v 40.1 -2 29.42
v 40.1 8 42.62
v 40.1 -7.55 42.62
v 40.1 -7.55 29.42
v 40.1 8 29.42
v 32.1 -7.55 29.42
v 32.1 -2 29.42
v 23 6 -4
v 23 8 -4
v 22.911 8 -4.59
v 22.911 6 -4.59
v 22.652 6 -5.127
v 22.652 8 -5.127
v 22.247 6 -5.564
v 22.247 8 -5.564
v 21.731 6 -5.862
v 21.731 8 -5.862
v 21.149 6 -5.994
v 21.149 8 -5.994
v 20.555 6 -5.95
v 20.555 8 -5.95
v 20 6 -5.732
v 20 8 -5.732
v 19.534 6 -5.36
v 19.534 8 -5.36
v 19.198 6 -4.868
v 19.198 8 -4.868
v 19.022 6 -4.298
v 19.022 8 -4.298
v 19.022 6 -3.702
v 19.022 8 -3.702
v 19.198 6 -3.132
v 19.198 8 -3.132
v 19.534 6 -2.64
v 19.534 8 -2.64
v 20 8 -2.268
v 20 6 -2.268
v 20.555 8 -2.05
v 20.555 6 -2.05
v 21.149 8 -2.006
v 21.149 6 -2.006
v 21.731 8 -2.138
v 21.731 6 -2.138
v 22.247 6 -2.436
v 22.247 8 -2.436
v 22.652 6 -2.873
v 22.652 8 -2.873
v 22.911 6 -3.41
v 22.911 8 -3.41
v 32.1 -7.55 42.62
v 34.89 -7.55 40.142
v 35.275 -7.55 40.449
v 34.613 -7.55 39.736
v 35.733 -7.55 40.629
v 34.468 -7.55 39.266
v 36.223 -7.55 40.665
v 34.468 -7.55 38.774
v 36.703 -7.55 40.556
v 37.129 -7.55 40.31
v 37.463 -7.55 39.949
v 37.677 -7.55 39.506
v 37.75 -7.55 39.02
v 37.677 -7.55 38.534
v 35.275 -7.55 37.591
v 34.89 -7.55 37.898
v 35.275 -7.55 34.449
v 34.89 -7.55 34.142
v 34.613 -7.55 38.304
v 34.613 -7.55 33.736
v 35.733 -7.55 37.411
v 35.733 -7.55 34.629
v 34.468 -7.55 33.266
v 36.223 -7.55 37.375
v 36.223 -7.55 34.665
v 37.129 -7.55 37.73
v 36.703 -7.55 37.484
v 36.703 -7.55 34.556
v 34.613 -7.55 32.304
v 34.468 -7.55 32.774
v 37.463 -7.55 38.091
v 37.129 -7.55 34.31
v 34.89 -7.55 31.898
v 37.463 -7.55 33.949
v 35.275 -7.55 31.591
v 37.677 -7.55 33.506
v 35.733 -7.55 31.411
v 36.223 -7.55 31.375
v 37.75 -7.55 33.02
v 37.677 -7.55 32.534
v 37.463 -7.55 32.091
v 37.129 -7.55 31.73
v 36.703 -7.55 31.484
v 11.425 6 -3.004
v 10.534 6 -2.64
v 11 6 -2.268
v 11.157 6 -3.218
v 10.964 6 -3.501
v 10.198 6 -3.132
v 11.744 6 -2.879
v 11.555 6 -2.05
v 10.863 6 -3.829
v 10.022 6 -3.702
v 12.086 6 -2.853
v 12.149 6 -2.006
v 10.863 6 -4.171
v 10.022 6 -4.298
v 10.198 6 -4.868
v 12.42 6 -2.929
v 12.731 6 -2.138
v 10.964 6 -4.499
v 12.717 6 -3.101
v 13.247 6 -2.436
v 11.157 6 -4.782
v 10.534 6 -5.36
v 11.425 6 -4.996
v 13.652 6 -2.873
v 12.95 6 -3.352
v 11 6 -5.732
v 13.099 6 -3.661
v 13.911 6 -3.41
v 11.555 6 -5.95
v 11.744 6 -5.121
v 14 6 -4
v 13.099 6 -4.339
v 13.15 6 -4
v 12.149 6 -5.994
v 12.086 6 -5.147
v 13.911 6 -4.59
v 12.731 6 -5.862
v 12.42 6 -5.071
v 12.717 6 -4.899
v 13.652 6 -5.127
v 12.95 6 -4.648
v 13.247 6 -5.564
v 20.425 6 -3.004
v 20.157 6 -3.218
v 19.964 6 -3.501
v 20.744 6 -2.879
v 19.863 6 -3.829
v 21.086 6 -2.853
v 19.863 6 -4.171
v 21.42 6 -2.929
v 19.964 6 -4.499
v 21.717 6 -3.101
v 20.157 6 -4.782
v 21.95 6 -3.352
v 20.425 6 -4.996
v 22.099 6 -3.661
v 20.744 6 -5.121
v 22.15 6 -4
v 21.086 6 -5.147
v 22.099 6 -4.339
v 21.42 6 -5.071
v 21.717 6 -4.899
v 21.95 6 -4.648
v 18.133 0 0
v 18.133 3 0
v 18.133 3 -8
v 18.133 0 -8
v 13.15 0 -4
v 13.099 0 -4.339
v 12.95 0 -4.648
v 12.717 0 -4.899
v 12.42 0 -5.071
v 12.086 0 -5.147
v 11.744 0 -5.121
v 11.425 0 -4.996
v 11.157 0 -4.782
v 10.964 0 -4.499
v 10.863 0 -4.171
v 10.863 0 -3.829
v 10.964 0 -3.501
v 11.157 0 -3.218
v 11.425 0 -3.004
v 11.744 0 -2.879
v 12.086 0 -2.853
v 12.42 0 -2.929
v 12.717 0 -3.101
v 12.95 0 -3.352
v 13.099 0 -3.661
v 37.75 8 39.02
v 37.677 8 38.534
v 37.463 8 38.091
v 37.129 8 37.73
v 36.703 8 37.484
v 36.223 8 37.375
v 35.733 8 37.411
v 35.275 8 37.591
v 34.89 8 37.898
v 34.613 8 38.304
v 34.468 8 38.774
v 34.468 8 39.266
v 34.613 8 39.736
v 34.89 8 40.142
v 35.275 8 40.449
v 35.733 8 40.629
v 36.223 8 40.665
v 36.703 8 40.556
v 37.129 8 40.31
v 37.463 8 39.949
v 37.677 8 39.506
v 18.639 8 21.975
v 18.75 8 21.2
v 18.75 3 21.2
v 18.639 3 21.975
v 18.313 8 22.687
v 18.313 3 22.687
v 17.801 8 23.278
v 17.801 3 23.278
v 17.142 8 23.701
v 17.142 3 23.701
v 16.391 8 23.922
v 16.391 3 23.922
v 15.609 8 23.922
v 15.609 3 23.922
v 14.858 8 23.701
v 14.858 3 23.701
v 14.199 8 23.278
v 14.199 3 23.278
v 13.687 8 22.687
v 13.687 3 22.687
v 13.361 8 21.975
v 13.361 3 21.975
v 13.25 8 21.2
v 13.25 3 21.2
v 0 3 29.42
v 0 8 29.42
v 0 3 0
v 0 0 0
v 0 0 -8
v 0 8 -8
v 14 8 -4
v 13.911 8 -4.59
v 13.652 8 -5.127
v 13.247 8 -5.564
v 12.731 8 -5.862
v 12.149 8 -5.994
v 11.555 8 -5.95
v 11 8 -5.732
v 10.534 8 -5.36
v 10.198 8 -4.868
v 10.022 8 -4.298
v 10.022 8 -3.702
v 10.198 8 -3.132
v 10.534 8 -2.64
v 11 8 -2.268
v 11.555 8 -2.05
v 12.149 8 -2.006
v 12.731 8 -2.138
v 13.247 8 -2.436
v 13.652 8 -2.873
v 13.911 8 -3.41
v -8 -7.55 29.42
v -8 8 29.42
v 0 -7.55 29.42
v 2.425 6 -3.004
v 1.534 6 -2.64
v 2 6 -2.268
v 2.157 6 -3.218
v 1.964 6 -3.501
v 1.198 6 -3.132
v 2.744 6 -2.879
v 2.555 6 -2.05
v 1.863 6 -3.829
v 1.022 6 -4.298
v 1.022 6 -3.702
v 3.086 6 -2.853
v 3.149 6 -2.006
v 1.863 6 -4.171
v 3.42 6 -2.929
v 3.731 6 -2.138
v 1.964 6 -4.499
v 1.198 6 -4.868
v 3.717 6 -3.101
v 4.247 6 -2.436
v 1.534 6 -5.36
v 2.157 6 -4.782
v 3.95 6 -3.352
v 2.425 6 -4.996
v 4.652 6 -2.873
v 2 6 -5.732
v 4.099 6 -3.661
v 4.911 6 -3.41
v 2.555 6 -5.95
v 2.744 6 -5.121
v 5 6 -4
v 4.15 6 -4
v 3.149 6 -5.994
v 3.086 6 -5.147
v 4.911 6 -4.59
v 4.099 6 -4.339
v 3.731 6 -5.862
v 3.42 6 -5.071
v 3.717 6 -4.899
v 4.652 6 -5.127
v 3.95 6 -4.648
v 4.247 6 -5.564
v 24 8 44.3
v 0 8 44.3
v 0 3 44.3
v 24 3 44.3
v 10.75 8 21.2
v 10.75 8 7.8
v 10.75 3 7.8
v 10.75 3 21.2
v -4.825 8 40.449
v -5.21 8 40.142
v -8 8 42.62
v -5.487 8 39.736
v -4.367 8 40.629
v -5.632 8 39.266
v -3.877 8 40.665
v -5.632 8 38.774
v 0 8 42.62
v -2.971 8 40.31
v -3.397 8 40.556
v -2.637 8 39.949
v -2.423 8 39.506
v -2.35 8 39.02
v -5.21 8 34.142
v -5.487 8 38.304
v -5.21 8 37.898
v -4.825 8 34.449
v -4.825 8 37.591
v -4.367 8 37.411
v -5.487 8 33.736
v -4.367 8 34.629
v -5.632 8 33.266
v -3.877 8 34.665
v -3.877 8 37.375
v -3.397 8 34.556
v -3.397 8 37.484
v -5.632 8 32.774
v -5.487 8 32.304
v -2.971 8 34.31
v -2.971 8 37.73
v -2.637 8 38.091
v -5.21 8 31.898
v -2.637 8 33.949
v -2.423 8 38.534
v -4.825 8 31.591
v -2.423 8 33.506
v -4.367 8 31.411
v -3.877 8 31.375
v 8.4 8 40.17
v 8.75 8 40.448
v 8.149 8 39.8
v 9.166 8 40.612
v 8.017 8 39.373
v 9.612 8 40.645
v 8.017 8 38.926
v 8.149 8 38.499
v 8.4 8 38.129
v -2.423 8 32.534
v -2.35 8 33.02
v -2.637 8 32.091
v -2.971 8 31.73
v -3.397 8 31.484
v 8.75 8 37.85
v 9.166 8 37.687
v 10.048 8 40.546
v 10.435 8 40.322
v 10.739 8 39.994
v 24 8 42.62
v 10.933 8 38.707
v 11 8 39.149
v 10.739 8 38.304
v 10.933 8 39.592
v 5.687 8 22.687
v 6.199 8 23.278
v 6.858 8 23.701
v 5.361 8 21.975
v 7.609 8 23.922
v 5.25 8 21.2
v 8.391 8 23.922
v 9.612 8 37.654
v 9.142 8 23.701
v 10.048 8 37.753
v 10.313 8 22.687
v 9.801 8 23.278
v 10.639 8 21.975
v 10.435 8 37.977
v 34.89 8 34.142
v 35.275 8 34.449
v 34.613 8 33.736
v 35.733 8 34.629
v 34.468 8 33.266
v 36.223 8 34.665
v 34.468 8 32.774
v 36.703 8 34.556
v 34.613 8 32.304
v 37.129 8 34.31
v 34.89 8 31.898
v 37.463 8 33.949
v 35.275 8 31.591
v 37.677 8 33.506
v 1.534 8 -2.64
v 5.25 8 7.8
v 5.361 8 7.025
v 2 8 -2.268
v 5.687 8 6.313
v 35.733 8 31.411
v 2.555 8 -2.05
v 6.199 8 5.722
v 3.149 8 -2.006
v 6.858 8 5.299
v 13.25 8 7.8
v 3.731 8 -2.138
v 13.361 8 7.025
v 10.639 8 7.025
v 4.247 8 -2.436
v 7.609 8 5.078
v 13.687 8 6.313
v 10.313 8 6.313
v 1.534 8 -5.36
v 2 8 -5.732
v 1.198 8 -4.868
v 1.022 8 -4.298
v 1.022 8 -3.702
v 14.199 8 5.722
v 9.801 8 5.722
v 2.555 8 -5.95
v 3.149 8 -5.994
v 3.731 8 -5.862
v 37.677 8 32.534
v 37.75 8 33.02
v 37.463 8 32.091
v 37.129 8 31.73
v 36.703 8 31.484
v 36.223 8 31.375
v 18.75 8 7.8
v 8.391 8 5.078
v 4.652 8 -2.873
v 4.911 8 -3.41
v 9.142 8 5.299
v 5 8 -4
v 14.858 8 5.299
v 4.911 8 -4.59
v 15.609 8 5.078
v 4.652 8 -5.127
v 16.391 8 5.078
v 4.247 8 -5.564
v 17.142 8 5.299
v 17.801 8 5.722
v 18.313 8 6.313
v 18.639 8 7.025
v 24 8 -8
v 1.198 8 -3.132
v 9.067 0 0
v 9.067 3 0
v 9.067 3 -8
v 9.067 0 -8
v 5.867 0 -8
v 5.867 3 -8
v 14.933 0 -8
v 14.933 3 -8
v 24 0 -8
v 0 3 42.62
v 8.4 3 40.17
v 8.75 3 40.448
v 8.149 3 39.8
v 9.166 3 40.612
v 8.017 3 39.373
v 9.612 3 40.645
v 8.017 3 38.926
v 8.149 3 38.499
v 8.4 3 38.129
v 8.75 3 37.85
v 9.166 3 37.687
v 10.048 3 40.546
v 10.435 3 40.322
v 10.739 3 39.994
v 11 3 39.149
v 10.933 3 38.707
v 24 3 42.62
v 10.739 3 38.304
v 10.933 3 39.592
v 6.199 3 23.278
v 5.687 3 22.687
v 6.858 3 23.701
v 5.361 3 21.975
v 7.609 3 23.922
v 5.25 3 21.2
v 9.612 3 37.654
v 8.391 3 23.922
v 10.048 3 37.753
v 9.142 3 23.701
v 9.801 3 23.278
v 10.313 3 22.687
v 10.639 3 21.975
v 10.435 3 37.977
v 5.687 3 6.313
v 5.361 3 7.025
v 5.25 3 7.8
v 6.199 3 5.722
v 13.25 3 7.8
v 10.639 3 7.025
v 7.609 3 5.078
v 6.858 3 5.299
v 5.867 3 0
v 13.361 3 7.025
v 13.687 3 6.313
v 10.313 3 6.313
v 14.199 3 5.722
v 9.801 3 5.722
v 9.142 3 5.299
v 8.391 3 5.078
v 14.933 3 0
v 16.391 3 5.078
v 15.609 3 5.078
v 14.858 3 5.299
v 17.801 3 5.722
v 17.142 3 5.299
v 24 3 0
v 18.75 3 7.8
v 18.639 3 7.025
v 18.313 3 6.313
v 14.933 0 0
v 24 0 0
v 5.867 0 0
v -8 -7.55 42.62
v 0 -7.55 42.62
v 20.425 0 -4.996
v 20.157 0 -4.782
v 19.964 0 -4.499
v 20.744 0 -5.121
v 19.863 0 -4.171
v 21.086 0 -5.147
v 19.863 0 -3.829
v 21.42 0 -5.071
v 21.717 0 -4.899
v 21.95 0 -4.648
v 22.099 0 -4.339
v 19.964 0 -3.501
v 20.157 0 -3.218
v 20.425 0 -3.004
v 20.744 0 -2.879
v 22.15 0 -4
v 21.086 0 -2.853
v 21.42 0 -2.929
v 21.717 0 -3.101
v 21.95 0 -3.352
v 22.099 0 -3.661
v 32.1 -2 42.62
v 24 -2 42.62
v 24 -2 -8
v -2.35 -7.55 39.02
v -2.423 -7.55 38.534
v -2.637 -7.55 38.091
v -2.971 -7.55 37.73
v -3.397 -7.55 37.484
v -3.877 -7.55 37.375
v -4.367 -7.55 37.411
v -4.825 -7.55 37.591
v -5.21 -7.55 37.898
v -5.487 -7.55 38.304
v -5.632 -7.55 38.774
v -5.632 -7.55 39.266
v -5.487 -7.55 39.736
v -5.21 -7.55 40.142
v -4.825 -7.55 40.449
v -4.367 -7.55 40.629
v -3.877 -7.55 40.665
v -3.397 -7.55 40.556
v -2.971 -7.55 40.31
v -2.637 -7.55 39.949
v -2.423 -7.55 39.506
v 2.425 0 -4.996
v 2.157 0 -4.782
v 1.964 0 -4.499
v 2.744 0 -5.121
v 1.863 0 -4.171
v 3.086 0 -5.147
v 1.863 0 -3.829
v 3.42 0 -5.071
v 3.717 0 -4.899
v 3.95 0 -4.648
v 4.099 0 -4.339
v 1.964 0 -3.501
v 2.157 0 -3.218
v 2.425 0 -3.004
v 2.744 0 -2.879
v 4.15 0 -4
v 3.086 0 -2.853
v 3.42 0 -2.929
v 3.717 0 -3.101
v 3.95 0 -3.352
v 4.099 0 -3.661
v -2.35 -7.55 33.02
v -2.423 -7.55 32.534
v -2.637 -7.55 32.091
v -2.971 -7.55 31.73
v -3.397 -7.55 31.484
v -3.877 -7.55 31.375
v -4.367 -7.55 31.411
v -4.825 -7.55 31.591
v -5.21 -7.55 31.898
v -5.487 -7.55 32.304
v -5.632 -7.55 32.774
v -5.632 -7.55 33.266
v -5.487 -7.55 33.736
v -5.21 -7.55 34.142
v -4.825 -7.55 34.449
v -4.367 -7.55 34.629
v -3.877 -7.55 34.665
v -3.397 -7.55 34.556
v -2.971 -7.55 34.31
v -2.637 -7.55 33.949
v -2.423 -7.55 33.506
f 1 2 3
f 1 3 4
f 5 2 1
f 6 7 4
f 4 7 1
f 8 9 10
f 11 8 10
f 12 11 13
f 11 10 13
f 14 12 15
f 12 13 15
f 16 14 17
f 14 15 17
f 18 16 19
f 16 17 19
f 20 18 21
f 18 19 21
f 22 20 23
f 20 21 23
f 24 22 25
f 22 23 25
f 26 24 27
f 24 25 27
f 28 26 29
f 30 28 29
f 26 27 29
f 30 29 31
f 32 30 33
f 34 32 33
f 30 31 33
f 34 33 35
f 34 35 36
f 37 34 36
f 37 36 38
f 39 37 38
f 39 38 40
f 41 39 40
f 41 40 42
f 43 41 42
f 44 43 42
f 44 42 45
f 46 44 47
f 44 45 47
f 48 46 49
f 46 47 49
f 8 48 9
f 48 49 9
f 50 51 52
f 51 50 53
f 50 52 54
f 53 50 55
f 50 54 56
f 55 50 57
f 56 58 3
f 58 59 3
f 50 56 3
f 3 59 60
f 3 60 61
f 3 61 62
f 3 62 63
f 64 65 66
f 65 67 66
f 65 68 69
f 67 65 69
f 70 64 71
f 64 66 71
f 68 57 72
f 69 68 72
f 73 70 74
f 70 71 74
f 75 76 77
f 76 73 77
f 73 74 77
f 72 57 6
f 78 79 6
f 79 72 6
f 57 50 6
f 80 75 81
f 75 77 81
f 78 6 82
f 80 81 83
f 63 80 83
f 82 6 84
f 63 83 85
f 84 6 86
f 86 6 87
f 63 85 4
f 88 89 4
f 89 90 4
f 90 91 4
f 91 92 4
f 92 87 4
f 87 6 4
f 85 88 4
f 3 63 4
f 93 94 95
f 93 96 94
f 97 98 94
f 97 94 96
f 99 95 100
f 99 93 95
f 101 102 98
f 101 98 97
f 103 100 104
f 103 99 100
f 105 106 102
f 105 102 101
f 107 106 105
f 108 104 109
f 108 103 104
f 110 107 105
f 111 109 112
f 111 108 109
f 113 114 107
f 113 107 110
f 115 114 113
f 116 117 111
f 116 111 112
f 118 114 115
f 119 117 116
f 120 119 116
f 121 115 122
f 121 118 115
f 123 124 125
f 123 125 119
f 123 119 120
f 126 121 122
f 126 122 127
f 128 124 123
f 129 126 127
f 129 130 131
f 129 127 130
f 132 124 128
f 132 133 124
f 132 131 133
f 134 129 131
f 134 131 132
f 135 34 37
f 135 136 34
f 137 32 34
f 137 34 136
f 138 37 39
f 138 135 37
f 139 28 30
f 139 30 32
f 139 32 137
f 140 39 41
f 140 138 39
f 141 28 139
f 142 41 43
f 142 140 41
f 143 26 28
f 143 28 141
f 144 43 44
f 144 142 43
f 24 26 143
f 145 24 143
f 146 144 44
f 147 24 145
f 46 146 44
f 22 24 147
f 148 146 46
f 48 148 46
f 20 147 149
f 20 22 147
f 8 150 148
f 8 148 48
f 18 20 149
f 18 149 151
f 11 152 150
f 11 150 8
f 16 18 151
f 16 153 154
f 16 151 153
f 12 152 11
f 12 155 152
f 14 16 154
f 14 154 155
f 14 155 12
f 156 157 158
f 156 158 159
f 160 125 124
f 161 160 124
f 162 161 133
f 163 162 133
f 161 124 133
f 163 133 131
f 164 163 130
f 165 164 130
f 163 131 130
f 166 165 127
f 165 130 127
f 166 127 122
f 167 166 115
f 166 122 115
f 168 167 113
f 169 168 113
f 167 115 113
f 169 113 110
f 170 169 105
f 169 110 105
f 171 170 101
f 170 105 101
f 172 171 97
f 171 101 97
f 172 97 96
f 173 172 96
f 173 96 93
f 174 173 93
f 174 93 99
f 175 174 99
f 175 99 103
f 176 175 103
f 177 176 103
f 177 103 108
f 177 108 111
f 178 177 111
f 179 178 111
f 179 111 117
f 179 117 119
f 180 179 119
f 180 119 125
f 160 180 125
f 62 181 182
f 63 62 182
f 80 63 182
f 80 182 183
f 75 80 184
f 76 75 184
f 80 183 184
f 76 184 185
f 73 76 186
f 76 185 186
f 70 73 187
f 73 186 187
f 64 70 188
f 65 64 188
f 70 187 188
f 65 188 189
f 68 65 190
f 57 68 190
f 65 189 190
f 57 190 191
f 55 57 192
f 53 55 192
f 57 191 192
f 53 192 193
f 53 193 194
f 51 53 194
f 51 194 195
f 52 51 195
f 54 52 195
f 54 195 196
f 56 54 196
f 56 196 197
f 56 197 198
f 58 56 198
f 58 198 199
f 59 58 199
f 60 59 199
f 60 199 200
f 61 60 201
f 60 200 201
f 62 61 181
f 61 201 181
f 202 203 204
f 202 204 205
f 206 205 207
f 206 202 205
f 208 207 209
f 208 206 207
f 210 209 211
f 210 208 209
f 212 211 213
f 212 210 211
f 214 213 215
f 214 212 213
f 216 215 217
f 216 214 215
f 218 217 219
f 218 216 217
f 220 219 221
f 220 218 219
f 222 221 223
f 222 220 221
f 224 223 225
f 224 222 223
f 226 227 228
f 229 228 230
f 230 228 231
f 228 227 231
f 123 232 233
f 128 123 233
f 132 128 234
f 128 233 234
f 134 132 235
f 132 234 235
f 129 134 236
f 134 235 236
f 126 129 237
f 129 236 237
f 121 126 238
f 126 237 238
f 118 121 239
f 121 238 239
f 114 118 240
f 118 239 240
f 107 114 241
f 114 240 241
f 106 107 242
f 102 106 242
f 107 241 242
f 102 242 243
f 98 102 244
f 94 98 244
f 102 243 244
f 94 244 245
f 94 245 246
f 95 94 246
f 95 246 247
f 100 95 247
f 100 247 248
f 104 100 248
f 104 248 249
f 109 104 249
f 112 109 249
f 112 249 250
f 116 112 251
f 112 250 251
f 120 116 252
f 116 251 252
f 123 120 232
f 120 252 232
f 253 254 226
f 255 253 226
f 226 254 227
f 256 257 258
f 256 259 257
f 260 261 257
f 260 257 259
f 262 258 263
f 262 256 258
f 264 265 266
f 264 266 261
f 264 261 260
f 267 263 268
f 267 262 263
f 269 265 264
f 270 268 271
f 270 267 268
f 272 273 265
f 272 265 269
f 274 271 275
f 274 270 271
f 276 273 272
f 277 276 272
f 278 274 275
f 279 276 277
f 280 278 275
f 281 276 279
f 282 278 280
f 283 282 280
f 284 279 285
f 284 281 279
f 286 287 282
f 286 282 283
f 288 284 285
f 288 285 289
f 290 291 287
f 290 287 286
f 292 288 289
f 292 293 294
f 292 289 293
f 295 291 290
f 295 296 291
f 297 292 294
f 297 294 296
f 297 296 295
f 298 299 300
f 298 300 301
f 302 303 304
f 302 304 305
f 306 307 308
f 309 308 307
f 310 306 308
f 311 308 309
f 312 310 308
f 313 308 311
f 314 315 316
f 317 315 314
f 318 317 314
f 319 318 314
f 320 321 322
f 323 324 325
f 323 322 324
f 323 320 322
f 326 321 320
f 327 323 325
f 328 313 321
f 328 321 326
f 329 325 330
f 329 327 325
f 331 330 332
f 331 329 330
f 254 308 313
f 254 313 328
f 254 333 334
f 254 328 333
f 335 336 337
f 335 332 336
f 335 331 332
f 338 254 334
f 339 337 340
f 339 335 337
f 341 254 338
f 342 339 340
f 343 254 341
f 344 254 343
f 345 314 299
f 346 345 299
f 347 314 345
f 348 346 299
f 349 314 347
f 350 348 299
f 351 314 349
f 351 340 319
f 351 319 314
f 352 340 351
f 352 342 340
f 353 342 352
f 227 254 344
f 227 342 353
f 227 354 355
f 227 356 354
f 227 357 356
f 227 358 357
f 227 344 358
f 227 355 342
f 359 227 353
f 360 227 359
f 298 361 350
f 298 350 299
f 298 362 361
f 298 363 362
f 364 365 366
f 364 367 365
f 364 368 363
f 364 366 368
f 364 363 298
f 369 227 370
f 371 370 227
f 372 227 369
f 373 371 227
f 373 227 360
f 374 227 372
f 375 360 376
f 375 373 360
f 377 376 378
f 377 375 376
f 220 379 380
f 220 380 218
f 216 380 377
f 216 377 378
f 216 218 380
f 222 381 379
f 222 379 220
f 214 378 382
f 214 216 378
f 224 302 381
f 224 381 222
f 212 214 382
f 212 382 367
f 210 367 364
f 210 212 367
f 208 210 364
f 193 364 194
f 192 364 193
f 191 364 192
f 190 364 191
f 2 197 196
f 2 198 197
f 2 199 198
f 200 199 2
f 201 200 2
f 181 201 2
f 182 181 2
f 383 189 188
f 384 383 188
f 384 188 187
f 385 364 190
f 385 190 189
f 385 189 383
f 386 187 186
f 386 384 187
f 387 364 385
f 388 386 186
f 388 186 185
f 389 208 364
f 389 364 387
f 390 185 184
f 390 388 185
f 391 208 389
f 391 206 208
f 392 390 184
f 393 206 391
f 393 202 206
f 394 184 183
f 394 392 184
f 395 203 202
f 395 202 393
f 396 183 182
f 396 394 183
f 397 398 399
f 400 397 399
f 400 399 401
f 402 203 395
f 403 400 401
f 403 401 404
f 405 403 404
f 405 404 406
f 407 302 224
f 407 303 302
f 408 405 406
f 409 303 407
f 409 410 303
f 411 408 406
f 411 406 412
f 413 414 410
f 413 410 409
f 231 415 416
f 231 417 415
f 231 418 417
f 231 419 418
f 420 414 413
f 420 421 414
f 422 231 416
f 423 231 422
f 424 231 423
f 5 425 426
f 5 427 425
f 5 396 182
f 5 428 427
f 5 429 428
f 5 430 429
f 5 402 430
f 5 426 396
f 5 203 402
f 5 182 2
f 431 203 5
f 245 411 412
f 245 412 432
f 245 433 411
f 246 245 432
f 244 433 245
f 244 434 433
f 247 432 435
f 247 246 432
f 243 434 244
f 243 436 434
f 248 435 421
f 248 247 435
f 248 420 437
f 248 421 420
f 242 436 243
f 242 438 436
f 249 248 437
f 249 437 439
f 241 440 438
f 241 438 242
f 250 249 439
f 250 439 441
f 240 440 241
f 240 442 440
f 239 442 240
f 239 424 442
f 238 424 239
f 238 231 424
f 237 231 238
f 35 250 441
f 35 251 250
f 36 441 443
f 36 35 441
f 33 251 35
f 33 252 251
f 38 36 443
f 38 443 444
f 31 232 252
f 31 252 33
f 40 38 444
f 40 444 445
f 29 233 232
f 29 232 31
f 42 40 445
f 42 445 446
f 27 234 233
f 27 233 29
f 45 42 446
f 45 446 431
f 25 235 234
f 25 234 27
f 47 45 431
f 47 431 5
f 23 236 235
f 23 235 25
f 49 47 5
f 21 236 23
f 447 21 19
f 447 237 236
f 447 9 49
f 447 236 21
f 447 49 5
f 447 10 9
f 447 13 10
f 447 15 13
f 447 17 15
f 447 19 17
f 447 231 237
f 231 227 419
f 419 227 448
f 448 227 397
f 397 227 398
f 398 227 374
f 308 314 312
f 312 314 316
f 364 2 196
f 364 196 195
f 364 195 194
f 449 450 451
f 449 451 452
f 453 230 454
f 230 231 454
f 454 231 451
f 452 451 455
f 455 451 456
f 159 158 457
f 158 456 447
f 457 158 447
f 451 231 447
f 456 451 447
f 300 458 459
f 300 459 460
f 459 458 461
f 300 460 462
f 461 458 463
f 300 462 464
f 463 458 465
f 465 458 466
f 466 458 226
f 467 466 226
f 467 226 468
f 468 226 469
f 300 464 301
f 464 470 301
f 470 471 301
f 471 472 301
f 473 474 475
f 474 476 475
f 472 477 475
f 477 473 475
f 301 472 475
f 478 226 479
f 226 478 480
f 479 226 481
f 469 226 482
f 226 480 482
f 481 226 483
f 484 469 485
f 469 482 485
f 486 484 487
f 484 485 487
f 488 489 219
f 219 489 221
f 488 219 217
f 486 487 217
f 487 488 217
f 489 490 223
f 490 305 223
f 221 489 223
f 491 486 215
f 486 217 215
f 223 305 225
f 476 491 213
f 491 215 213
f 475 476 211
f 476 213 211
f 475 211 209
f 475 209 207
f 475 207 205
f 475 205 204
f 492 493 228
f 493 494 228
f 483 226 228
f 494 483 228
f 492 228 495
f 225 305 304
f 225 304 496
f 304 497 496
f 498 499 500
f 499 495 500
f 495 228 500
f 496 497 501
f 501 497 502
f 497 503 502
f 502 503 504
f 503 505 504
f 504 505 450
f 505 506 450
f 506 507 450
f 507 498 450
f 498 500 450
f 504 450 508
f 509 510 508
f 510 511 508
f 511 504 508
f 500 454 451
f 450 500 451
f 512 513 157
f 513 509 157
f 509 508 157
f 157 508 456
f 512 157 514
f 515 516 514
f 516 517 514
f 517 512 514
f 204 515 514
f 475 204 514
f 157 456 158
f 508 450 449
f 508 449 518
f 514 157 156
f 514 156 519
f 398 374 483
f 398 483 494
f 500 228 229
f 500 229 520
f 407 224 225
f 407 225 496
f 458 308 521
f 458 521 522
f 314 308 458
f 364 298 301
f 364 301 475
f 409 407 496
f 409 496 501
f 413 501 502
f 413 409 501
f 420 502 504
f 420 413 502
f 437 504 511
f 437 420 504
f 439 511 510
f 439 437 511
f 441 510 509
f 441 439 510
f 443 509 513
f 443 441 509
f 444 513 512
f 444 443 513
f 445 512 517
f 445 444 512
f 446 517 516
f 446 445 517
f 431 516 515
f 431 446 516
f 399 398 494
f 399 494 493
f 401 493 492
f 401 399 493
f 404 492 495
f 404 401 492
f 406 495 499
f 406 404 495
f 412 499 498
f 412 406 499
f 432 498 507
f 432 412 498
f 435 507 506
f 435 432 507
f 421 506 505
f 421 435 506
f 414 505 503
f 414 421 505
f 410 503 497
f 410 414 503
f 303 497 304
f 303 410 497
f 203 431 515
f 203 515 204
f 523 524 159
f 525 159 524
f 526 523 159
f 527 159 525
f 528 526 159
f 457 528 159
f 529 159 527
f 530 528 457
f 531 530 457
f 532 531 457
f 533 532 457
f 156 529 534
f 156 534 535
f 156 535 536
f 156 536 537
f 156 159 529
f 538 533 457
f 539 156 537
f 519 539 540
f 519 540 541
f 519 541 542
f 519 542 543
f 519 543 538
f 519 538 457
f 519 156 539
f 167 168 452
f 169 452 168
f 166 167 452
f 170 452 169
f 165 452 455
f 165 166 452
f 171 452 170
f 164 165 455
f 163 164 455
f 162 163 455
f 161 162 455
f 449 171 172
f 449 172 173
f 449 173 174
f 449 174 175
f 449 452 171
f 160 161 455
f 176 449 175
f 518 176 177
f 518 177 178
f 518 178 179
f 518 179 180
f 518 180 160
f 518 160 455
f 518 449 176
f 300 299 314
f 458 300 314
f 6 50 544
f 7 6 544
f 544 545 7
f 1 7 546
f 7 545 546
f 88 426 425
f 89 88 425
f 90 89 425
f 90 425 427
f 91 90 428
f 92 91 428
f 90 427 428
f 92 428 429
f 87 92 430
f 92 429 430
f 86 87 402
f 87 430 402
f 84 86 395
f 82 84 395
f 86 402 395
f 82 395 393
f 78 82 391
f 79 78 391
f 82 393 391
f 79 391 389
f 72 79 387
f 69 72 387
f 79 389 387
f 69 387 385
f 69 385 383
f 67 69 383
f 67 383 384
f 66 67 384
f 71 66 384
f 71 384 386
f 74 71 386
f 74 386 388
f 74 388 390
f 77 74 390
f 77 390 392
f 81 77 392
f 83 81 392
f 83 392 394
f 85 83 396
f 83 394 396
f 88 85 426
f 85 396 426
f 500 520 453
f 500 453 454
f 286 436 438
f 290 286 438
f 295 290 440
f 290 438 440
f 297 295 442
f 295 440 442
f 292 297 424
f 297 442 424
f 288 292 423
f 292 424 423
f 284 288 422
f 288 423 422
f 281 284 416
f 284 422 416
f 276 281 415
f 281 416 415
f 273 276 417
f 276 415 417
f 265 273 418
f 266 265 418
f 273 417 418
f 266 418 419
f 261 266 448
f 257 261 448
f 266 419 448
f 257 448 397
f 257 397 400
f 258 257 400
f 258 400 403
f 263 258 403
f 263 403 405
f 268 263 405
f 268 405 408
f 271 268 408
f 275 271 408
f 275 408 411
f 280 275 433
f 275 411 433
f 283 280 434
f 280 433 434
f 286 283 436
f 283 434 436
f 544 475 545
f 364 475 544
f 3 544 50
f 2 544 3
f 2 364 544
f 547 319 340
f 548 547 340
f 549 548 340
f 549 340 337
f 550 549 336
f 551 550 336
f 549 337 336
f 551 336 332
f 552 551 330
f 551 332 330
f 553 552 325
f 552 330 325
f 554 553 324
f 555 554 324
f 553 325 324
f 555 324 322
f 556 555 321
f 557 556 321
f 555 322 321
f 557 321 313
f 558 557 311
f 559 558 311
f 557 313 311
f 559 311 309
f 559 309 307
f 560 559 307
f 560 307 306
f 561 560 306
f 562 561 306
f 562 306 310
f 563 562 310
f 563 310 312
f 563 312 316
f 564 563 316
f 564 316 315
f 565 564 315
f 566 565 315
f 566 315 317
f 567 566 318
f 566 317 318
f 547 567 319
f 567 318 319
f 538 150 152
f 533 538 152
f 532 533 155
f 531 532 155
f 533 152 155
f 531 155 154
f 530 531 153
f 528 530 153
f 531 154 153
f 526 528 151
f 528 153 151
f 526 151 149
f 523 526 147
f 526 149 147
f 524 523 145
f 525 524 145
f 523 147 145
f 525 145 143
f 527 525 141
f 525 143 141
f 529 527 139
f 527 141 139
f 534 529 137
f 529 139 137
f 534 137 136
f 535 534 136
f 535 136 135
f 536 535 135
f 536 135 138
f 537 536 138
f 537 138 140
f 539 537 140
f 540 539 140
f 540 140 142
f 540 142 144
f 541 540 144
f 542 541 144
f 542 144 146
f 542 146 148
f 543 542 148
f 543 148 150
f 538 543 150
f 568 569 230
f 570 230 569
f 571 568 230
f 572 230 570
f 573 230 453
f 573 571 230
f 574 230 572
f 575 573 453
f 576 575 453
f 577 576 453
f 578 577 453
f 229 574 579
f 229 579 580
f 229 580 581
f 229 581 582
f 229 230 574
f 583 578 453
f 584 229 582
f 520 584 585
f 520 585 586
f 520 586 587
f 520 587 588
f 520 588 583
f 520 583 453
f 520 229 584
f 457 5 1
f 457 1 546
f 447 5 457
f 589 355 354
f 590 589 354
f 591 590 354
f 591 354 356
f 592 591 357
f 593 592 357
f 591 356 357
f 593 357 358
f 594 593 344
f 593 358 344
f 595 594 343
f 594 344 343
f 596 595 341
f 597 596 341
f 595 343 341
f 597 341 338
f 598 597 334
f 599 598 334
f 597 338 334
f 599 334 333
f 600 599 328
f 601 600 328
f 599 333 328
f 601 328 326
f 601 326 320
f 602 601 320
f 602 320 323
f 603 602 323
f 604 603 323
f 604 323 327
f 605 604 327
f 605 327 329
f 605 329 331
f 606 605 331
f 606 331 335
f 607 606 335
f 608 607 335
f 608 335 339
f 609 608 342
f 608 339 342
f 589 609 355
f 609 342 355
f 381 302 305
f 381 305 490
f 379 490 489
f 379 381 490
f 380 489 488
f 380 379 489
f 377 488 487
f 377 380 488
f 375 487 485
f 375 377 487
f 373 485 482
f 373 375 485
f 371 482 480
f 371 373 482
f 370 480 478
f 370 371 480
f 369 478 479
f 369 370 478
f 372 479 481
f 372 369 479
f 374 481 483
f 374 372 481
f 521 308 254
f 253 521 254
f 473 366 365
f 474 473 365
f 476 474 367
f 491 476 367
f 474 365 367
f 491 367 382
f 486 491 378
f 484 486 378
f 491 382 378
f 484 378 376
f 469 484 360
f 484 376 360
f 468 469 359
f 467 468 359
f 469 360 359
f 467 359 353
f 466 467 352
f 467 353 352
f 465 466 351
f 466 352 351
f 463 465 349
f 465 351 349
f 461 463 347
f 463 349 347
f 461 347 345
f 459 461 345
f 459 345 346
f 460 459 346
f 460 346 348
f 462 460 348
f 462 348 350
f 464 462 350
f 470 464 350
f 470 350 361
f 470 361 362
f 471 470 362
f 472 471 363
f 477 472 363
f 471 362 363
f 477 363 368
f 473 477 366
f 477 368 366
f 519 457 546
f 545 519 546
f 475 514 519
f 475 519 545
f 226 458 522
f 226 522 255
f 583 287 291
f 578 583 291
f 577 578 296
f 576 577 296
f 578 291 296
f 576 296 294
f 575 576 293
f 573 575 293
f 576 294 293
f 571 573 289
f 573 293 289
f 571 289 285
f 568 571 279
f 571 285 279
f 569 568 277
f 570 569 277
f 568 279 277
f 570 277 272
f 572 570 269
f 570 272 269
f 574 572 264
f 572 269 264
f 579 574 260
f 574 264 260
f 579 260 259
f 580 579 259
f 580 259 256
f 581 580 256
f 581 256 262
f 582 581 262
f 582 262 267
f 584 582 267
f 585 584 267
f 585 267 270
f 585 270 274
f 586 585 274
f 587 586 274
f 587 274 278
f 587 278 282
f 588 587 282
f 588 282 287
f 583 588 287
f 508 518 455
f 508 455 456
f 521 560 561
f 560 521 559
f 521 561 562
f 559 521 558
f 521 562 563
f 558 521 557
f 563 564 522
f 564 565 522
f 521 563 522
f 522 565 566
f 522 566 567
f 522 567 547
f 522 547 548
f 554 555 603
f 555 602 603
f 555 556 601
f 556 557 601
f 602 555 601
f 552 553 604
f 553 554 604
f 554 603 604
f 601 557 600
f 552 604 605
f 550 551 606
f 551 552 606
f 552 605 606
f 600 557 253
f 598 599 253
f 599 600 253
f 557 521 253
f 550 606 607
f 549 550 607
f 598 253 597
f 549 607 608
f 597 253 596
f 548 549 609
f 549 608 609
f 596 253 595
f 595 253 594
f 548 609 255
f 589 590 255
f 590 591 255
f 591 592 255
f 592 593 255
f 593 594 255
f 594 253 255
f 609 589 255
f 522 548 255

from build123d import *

# Parameters (mm, degrees)
BOSS_EXTRUDE1_DEPTH = 8
SKETCH2_R           = 1.15
CUT_EXTRUDE1_DEPTH  = 9
SKETCH3_R           = 2
CUT_EXTRUDE2_DEPTH  = 2
SKETCH5_W           = 24
SKETCH5_H           = 44.3
SKETCH5_R           = 1.5
BOSS_EXTRUDE2_DEPTH = 5
CUT_EXTRUDE3_DEPTH  = 20
SKETCH7_W           = 8
SKETCH7_H           = 13.2
SKETCH7_R           = 1.65
SKETCH7_W_2         = 16.1
BOSS_EXTRUDE3_DEPTH = 15.55
SKETCH8_W           = 8.1
SKETCH8_H           = 5.55
CUT_EXTRUDE4_DEPTH  = 25
BOSS_EXTRUDE4_DEPTH = 10


with BuildPart() as part:
    # Sketch1 → Boss-Extrude1 (new body)
    with BuildSketch(Plane.XY):
        Polygon((0, 0), (5.866666667, 0), (5.866666667, 3), (9.066666667, 3), (9.066666667, 0), (14.933333333, 0), (14.933333333, 3), (18.133333333, 3), (18.133333333, 0), (24, 0), (24, 8), (0, 8), align=None)
    extrude(amount=-BOSS_EXTRUDE1_DEPTH)

    # Sketch2 → Cut-Extrude1 (cut, through all)
    with BuildSketch(Plane(origin=(0, 8, 0), x_dir=(1, 0, 0), z_dir=(0, 1, 0))):
        with Locations((3, 4)):
            Circle(SKETCH2_R)
        with Locations((12, 4)):
            Circle(SKETCH2_R)
        with Locations((21, 4)):
            Circle(SKETCH2_R)
    extrude(amount=-CUT_EXTRUDE1_DEPTH, mode=Mode.SUBTRACT)

    # Sketch3 → Cut-Extrude2 (cut)
    with BuildSketch(Plane(origin=(0, 8, 0), x_dir=(1, 0, 0), z_dir=(0, 1, 0))):
        with Locations((3, 4)):
            Circle(SKETCH3_R)
        with Locations((12, 4)):
            Circle(SKETCH3_R)
        with Locations((21, 4)):
            Circle(SKETCH3_R)
    extrude(amount=-CUT_EXTRUDE2_DEPTH, mode=Mode.SUBTRACT)

    # Sketch5 → Boss-Extrude2 (add)
    with BuildSketch(Plane(origin=(0, 8, 0), x_dir=(1, 0, 0), z_dir=(0, 1, 0))):
        with Locations((12, -22.15)):
            Rectangle(SKETCH5_W, SKETCH5_H)
        with Locations((9.5, -39.149393889)):
            Circle(SKETCH5_R, mode=Mode.SUBTRACT)
    extrude(amount=-BOSS_EXTRUDE2_DEPTH)

    # Sketch6 → Cut-Extrude3 (cut)
    with BuildSketch(Plane(origin=(0, 8, 0), x_dir=(1, 0, 0), z_dir=(0, 1, 0))):
        with BuildLine():
            Line((10.75, -7.8), (10.75, -21.2))
            ThreePointArc((10.75, -21.2), (8, -23.95), (5.25, -21.2))
            Line((5.25, -21.2), (5.25, -7.8))
            ThreePointArc((5.25, -7.8), (8, -5.05), (10.75, -7.8))
        make_face()
        with BuildLine():
            Line((18.75, -7.8), (18.75, -21.2))
            ThreePointArc((18.75, -21.2), (16, -23.95), (13.25, -21.2))
            Line((13.25, -21.2), (13.25, -7.8))
            ThreePointArc((13.25, -7.8), (16, -5.05), (18.75, -7.8))
        make_face()
    extrude(amount=-CUT_EXTRUDE3_DEPTH, mode=Mode.SUBTRACT)

    # Sketch7 → Boss-Extrude3 (add)
    with BuildSketch(Plane(origin=(0, 8, 0), x_dir=(1, 0, 0), z_dir=(0, 1, 0))):
        with Locations((-4, -36.02)):
            Rectangle(SKETCH7_W, SKETCH7_H)
        with Locations((-4, -33.02)):
            Circle(SKETCH7_R, mode=Mode.SUBTRACT)
        with Locations((-4, -39.02)):
            Circle(SKETCH7_R, mode=Mode.SUBTRACT)
        with Locations((32.05, -36.02)):
            Rectangle(SKETCH7_W_2, SKETCH7_H)
        with Locations((36.1, -33.02)):
            Circle(SKETCH7_R, mode=Mode.SUBTRACT)
        with Locations((36.1, -39.02)):
            Circle(SKETCH7_R, mode=Mode.SUBTRACT)
    extrude(amount=-BOSS_EXTRUDE3_DEPTH)

    # Sketch8 → Cut-Extrude4 (cut)
    with BuildSketch(Plane.XY.offset(42.62)):
        with Locations((28.05, -4.775)):
            Rectangle(SKETCH8_W, SKETCH8_H)
    extrude(amount=-CUT_EXTRUDE4_DEPTH, mode=Mode.SUBTRACT)

    # Sketch10 → Boss-Extrude4 (add)
    with BuildSketch(Plane(origin=(0, 8, 0), x_dir=(1, 0, 0), z_dir=(0, 1, 0))):
        Polygon((40.1, -29.42), (24, 8), (24, -29.42), align=None)
    extrude(amount=-BOSS_EXTRUDE4_DEPTH)


solid = part.part
